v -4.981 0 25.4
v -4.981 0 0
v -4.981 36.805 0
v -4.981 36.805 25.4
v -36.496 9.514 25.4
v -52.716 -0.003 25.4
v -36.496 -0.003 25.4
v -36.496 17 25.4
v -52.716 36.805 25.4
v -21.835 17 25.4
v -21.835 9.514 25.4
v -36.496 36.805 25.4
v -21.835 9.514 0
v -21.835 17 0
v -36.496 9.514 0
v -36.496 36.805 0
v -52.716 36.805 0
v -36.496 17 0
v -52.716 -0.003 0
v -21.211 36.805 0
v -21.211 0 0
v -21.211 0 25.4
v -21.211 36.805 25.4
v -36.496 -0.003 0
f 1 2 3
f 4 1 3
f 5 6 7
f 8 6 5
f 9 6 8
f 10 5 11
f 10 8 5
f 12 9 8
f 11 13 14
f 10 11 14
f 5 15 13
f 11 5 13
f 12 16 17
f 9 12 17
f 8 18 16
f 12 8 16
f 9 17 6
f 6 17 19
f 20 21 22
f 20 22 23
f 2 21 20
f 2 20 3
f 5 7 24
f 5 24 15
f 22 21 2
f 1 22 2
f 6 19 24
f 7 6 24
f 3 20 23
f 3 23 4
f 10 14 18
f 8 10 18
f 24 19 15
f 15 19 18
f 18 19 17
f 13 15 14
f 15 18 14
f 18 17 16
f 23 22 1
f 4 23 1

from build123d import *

# Parameters (mm, degrees)
F0_W     = 16.2306
F0_H     = 36.8046
F1_DEPTH = 25.4


with BuildPart() as f1:
    # F0 (on Top) → F1 (new body)
    with BuildSketch(Plane.XY):
        Polygon((-36.49579, 12.009297), (-36.49579, 9.51386), (-21.835089, 9.51386), (-21.835089, 17.000175), (-36.49579, 17.000175), align=None)
        with Locations((-13.095927, 18.4023)):
            Rectangle(F0_W, F0_H)
        Polygon((-52.716143, -0.003118), (-36.49579, -0.003118), (-36.49579, 9.51386), (-36.49579, 12.009297), (-36.49579, 17.000175), (-36.49579, 21.991052), (-36.49579, 36.8046), (-52.716143, 36.8046), align=None)
    extrude(amount=F1_DEPTH)


solid = f1.part
